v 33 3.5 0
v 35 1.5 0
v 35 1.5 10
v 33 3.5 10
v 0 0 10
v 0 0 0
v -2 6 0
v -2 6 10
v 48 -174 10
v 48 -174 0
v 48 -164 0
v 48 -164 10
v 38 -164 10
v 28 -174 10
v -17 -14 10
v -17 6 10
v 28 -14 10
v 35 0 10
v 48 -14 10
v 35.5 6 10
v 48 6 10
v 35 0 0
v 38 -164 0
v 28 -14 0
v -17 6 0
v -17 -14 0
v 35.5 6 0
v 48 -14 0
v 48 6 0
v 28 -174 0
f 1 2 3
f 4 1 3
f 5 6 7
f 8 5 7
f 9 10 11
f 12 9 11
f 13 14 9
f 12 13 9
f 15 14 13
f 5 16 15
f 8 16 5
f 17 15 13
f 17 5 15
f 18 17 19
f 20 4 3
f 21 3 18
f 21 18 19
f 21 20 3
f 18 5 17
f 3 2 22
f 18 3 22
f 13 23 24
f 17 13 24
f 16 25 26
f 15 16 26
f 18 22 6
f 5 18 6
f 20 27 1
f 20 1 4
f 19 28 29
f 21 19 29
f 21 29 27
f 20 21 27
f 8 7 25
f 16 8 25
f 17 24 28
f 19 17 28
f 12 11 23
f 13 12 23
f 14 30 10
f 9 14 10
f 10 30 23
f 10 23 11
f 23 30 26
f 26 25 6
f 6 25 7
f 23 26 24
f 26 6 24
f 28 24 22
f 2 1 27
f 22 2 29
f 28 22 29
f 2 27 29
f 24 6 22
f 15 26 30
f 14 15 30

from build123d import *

# Parameters (mm, degrees)
F1_DEPTH = 10
F2_SIZE  = 1.99999
F3_SIZE  = 2.5


# Not quite as in the source:
# - a fillet or chamfer is up to 0.001 mm smaller than in the source, because OpenCascade refuses the exact size


with BuildPart() as f1:
    # F0 (on Top) → F1 (new body)
    with BuildSketch(Plane.XY):
        Polygon((35, 0), (0, 0), (-2, 6), (-17, 6), (-17, -14), (28, -14), (48, -14), (48, 6), (33, 6), (33, 1.5), (35, 1.5), align=None)
        Polygon((28, -14), (-17, -14), (28, -174), (48, -174), (48, -164), (38, -164), align=None)
    extrude(amount=F1_DEPTH)

    # F2 (size 2 in the source; OpenCascade refuses exactly that, so slightly less here)
    f2_edges = [f1.edges().sort_by_distance(p)[0] for p in [
        (33, 1.5, 5),
    ]]
    chamfer(f2_edges, length=F2_SIZE)

    # F3
    f3_edges = [f1.edges().sort_by_distance(p)[0] for p in [
        (33, 6, 5),
    ]]
    chamfer(f3_edges, length=F3_SIZE)


solid = f1.part
